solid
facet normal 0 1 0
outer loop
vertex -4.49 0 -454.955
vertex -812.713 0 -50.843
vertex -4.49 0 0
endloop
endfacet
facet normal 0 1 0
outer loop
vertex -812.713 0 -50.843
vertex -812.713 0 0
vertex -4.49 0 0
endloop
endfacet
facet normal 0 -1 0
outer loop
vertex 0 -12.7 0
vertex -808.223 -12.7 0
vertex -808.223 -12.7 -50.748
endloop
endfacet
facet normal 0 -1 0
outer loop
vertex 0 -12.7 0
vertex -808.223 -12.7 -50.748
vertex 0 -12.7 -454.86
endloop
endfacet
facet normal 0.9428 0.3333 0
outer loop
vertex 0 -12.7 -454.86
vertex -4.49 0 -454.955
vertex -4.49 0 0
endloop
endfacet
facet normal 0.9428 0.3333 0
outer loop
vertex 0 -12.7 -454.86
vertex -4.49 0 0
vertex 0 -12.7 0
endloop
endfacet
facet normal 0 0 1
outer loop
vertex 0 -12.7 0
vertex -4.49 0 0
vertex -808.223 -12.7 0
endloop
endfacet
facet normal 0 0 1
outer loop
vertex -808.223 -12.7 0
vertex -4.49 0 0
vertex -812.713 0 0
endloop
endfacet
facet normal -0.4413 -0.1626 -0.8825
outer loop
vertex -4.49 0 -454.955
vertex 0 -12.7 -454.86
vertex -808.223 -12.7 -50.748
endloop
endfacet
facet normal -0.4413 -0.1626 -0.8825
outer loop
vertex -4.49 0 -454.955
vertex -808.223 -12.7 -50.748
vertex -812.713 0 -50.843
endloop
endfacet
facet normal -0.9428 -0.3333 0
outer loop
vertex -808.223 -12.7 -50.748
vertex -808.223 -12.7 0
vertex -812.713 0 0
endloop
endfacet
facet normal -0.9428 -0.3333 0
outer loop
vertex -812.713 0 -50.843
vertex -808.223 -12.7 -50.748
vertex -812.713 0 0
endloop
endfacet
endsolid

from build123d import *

# Parameters (mm, degrees)
F1_DEPTH      = 12.7
F6_DEPTH      = 511.1661396565
F6_DEPTH_BACK = 511.1661396565
F7_DEPTH      = 457.201


with BuildPart() as f1:
    # F0 (on Front) → F1 (new body)
    with BuildSketch(Plane.XZ):
        Polygon((0, -457.2), (0, 0), (-914.4, 0), align=None)
    extrude(amount=F1_DEPTH)

    # F5 (on face) → F6 (cut, two sides)
    with BuildSketch(Plane(origin=(-274.32, 0, 137.16), x_dir=(0, -1, 0), z_dir=(-0.894427191, 0, 0.4472135955))) as f6_sk:
        Polygon((12.7, -406.8387485734), (0, -408.9321117252), (12.7, -408.9321117252), align=None)
    extrude(amount=-F6_DEPTH, mode=Mode.SUBTRACT)
    extrude(f6_sk.sketch, amount=F6_DEPTH_BACK, mode=Mode.SUBTRACT)

    # F2 (on face) → F7 (cut, through all)
    with BuildSketch(Plane.XY):
        Polygon((-914.4, -12.7), (-808.223047, -12.7), (-812.7131750519, 0), (-914.4, 0), align=None)
        Polygon((-4.4901280519, 0), (0, -12.7), (0, 0), align=None)
    extrude(amount=-F7_DEPTH, mode=Mode.SUBTRACT)


solid = f1.part
